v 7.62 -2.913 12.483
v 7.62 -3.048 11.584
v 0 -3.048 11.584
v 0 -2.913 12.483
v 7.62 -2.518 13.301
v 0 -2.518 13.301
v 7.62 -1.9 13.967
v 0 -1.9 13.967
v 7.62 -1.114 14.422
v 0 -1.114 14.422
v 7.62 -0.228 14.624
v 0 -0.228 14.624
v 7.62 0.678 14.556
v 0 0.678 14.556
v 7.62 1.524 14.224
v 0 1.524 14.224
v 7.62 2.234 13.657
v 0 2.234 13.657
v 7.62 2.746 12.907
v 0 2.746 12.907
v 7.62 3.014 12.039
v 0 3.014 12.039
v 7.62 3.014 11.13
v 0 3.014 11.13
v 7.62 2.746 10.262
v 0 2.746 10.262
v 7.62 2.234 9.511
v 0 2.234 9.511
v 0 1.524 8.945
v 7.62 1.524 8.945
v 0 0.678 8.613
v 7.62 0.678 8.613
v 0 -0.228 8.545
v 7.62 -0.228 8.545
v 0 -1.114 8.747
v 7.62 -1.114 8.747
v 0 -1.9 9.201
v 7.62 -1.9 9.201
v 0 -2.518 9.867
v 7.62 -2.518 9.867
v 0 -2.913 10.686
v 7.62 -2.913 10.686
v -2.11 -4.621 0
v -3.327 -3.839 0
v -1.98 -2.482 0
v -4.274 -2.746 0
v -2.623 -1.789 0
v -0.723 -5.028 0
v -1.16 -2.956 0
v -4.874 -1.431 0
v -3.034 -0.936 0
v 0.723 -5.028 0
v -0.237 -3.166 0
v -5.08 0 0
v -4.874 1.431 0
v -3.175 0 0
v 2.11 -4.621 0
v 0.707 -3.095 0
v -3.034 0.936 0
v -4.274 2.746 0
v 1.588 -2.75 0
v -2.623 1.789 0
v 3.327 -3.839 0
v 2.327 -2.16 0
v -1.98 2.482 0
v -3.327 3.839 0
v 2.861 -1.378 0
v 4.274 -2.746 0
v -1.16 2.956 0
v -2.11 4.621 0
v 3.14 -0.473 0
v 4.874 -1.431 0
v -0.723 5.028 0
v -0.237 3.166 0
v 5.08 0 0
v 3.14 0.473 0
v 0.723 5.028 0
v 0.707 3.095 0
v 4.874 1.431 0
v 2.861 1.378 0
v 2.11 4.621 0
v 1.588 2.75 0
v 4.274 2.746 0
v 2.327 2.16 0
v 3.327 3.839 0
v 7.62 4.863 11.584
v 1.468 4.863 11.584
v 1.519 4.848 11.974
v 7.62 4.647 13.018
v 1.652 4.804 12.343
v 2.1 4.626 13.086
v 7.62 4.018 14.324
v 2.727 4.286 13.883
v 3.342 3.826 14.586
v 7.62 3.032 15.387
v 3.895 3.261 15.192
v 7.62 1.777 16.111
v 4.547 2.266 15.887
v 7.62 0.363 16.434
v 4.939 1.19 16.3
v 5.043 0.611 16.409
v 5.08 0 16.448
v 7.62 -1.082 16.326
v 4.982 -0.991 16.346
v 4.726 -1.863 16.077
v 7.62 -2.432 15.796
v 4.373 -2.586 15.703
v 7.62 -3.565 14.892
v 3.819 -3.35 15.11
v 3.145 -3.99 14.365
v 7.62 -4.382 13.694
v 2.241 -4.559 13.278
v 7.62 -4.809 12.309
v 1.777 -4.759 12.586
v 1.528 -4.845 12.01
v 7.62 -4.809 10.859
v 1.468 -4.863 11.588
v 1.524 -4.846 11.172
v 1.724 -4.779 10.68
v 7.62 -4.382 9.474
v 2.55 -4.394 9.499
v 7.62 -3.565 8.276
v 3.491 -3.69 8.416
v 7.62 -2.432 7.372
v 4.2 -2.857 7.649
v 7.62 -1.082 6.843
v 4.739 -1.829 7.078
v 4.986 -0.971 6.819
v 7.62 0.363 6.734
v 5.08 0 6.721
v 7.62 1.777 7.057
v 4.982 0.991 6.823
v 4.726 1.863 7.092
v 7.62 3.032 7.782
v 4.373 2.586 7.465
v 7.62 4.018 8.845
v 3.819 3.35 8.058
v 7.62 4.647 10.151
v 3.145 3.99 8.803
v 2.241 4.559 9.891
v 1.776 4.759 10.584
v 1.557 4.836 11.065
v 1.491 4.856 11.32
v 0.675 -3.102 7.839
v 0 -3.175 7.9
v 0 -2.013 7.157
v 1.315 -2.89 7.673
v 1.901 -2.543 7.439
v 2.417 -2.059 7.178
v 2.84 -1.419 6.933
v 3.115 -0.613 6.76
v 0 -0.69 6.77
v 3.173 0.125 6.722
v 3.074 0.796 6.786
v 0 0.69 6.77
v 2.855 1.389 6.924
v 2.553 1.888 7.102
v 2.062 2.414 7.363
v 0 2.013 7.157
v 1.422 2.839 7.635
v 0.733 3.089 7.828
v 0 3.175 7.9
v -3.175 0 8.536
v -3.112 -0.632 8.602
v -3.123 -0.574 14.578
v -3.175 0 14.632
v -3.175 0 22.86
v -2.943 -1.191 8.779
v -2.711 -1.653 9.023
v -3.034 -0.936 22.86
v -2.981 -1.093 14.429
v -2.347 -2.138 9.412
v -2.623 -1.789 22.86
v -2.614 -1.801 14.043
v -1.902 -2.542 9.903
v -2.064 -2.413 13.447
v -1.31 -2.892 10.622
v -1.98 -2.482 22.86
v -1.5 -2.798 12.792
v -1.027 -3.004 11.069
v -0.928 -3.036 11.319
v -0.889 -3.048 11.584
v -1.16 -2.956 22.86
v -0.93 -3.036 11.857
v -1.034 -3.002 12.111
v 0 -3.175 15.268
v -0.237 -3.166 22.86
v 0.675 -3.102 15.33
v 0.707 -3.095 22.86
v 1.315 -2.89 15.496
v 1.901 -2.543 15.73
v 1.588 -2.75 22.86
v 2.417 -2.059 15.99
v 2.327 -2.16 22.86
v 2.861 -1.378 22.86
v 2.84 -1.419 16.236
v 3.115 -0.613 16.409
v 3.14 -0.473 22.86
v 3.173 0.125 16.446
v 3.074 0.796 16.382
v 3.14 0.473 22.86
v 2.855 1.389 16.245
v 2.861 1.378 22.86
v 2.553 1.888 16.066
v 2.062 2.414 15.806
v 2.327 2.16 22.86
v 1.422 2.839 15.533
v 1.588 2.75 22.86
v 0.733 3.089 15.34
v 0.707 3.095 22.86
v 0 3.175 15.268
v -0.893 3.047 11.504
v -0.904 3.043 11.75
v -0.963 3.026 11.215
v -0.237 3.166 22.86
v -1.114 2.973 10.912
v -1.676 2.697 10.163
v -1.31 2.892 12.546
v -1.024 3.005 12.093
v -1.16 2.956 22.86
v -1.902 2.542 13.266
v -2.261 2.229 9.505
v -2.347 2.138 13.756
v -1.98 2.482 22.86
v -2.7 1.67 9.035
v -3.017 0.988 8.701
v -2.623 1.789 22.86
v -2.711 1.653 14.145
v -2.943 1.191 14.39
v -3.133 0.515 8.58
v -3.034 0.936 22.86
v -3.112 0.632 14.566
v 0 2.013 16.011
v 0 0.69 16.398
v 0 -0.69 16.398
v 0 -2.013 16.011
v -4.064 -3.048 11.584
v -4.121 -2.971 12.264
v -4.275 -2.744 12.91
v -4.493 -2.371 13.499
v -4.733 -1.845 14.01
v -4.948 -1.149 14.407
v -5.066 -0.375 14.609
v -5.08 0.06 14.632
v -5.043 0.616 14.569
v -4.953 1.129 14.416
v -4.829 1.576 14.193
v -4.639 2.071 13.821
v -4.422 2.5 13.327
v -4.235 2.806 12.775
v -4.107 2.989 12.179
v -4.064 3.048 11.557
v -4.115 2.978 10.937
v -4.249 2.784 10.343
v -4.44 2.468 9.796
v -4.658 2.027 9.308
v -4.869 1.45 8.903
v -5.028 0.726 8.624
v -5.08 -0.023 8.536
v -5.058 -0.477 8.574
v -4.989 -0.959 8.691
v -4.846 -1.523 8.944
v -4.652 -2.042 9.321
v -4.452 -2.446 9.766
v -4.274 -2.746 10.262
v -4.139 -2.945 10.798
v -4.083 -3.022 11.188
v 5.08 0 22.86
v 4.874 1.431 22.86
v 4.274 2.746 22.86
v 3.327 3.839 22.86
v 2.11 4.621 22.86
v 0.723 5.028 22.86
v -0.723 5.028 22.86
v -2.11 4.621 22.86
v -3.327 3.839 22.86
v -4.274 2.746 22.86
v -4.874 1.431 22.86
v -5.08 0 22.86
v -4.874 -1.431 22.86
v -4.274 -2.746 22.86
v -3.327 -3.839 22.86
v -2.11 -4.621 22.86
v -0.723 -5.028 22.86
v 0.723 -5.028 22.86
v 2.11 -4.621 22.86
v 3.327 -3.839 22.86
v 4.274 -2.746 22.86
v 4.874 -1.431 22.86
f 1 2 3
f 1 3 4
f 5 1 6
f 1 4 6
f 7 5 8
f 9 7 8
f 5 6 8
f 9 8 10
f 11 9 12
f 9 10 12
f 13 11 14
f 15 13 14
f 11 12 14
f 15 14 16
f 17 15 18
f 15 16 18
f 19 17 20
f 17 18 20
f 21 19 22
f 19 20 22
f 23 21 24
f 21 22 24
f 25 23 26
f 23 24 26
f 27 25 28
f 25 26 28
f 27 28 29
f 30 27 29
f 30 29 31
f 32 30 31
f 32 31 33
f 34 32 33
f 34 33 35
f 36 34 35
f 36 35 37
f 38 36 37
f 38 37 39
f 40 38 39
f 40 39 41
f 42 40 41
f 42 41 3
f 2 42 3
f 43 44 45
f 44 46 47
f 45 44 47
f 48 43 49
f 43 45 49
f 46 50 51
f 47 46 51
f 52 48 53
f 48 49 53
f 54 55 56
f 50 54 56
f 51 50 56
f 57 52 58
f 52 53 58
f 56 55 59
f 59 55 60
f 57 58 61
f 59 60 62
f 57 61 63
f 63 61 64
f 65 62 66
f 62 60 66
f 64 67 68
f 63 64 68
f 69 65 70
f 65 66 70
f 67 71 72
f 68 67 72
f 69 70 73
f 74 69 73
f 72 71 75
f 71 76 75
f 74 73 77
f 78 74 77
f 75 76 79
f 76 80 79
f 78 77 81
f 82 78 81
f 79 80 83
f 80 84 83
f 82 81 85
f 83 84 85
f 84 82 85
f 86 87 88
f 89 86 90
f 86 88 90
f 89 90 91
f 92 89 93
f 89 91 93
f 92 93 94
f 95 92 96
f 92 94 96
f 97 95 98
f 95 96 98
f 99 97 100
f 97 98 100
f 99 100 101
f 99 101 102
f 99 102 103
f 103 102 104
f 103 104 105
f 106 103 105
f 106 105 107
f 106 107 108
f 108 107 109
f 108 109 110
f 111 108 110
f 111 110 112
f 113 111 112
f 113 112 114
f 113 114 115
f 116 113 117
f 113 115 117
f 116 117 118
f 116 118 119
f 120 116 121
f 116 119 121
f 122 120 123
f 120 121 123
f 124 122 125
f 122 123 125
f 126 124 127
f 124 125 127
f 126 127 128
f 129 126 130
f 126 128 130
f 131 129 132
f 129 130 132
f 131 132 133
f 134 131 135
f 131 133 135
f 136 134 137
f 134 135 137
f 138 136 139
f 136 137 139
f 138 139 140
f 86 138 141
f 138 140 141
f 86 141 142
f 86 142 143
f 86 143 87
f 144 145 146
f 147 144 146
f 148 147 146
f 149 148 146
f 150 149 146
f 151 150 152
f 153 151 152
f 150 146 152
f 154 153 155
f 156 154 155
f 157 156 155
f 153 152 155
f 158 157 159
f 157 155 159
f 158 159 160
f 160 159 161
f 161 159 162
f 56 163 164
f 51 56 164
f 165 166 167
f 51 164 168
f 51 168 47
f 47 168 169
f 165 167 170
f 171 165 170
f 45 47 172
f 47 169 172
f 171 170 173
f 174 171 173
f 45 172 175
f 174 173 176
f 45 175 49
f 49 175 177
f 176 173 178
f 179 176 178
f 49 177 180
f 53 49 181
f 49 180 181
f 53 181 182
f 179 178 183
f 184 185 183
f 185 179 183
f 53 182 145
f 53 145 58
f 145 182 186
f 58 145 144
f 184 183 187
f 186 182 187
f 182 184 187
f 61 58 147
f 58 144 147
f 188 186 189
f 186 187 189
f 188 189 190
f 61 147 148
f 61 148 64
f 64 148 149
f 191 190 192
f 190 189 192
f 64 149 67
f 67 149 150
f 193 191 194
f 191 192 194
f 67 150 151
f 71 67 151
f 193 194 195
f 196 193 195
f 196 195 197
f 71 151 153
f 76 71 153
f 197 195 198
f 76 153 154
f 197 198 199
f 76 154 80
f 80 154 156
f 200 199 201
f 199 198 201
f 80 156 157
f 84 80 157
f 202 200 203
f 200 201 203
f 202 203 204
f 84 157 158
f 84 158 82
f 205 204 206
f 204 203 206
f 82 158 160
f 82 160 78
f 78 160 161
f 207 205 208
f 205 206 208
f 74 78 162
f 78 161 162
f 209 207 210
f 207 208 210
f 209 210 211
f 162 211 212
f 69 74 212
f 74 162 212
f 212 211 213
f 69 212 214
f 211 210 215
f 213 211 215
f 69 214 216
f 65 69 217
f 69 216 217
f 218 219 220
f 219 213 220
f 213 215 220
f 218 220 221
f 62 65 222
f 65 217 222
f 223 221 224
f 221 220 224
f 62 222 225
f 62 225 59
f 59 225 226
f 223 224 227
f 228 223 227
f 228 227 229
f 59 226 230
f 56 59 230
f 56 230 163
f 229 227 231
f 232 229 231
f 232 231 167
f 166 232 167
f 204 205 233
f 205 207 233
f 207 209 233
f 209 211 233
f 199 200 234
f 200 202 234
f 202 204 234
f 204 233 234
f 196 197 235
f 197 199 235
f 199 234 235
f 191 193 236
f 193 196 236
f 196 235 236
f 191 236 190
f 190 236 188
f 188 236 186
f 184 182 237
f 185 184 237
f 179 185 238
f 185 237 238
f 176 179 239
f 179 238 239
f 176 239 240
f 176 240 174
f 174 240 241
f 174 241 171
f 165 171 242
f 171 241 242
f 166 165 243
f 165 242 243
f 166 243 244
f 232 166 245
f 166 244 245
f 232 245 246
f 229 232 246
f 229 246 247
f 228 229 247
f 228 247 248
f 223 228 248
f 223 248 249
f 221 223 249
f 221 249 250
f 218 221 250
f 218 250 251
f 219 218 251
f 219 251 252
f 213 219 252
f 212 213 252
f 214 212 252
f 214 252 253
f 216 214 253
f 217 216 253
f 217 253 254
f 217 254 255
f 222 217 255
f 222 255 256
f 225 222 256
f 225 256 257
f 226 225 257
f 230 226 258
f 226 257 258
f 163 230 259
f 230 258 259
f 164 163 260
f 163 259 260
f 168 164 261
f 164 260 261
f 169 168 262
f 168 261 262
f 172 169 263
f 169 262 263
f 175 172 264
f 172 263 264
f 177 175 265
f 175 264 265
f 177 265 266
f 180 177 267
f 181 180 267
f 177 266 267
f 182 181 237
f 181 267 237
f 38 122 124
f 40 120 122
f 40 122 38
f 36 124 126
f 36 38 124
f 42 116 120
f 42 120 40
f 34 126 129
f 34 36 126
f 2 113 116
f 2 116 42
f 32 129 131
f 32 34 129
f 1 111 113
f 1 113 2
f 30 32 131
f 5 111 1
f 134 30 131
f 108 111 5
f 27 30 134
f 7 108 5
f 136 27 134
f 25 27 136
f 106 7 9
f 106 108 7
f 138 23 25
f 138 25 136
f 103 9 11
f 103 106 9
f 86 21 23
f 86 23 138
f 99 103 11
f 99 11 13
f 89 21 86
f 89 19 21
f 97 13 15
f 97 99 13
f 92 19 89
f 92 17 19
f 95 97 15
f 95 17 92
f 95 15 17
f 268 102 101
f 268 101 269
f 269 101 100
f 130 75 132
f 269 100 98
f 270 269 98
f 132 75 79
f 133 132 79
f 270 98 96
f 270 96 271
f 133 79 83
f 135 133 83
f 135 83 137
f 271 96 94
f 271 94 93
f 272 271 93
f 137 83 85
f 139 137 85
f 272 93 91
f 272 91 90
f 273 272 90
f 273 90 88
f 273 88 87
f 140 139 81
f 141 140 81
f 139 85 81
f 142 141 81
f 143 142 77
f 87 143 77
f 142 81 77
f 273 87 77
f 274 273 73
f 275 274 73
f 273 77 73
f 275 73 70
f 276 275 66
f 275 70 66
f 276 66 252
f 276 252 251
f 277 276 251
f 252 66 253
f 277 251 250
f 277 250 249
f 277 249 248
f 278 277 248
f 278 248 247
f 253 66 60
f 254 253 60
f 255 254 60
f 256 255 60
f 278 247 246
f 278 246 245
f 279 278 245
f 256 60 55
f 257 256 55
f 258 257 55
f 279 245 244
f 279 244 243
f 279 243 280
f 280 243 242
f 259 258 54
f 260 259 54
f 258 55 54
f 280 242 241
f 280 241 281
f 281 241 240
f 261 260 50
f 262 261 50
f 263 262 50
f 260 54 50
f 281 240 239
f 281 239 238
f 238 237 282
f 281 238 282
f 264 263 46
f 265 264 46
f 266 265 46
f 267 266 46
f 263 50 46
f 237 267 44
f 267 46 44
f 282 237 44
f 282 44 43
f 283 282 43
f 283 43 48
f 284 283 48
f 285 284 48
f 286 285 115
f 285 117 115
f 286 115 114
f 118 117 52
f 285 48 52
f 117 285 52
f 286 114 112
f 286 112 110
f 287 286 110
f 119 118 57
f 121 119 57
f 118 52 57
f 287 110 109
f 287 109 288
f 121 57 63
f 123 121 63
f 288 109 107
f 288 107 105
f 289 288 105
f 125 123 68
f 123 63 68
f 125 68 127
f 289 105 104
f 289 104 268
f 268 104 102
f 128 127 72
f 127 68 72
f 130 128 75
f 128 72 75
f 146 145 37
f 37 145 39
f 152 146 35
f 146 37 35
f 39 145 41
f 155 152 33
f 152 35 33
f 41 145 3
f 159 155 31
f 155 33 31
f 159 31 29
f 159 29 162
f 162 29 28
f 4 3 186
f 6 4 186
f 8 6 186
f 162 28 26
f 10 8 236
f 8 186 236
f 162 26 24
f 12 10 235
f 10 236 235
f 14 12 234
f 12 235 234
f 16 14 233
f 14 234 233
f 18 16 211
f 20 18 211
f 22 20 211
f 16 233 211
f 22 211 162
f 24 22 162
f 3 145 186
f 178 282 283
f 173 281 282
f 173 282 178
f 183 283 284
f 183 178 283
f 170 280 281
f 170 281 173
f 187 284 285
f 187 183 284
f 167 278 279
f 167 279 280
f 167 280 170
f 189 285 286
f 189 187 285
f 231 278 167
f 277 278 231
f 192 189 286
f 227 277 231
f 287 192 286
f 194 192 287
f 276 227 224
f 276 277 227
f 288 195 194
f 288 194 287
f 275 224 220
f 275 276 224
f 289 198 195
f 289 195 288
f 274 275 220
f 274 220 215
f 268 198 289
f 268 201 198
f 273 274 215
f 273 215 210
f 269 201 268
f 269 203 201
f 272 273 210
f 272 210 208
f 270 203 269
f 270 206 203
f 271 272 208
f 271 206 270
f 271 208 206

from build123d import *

# Parameters (mm, degrees)
F0_R     = 5.08
F1_DEPTH = 22.86
F3_D     = 6.35
F4_R     = 4.863365
F5_DEPTH = 7.62
F7_D     = 6.096


with BuildPart() as f1:
    # F0 (on Top) → F1 (new body)
    with BuildSketch(Plane.XY):
        Circle(F0_R)
    extrude(amount=F1_DEPTH)

    # F3 (through all)
    with Locations(Plane(origin=(0, 0, 0), x_dir=(1, 0, 0), z_dir=(0, 0, -1))):
        with Locations((0, 0)):
            Hole(F3_D / 2)

    # F4 (on Right) → F5 (join)
    with BuildSketch(Plane.YZ):
        with Locations((0, 11.58422)):
            Circle(F4_R)
    extrude(amount=F5_DEPTH)

    # F7 (through all)
    with Locations(Plane.YZ.offset(7.62)):
        with Locations((0, 11.58422)):
            Hole(F7_D / 2)


solid = f1.part
